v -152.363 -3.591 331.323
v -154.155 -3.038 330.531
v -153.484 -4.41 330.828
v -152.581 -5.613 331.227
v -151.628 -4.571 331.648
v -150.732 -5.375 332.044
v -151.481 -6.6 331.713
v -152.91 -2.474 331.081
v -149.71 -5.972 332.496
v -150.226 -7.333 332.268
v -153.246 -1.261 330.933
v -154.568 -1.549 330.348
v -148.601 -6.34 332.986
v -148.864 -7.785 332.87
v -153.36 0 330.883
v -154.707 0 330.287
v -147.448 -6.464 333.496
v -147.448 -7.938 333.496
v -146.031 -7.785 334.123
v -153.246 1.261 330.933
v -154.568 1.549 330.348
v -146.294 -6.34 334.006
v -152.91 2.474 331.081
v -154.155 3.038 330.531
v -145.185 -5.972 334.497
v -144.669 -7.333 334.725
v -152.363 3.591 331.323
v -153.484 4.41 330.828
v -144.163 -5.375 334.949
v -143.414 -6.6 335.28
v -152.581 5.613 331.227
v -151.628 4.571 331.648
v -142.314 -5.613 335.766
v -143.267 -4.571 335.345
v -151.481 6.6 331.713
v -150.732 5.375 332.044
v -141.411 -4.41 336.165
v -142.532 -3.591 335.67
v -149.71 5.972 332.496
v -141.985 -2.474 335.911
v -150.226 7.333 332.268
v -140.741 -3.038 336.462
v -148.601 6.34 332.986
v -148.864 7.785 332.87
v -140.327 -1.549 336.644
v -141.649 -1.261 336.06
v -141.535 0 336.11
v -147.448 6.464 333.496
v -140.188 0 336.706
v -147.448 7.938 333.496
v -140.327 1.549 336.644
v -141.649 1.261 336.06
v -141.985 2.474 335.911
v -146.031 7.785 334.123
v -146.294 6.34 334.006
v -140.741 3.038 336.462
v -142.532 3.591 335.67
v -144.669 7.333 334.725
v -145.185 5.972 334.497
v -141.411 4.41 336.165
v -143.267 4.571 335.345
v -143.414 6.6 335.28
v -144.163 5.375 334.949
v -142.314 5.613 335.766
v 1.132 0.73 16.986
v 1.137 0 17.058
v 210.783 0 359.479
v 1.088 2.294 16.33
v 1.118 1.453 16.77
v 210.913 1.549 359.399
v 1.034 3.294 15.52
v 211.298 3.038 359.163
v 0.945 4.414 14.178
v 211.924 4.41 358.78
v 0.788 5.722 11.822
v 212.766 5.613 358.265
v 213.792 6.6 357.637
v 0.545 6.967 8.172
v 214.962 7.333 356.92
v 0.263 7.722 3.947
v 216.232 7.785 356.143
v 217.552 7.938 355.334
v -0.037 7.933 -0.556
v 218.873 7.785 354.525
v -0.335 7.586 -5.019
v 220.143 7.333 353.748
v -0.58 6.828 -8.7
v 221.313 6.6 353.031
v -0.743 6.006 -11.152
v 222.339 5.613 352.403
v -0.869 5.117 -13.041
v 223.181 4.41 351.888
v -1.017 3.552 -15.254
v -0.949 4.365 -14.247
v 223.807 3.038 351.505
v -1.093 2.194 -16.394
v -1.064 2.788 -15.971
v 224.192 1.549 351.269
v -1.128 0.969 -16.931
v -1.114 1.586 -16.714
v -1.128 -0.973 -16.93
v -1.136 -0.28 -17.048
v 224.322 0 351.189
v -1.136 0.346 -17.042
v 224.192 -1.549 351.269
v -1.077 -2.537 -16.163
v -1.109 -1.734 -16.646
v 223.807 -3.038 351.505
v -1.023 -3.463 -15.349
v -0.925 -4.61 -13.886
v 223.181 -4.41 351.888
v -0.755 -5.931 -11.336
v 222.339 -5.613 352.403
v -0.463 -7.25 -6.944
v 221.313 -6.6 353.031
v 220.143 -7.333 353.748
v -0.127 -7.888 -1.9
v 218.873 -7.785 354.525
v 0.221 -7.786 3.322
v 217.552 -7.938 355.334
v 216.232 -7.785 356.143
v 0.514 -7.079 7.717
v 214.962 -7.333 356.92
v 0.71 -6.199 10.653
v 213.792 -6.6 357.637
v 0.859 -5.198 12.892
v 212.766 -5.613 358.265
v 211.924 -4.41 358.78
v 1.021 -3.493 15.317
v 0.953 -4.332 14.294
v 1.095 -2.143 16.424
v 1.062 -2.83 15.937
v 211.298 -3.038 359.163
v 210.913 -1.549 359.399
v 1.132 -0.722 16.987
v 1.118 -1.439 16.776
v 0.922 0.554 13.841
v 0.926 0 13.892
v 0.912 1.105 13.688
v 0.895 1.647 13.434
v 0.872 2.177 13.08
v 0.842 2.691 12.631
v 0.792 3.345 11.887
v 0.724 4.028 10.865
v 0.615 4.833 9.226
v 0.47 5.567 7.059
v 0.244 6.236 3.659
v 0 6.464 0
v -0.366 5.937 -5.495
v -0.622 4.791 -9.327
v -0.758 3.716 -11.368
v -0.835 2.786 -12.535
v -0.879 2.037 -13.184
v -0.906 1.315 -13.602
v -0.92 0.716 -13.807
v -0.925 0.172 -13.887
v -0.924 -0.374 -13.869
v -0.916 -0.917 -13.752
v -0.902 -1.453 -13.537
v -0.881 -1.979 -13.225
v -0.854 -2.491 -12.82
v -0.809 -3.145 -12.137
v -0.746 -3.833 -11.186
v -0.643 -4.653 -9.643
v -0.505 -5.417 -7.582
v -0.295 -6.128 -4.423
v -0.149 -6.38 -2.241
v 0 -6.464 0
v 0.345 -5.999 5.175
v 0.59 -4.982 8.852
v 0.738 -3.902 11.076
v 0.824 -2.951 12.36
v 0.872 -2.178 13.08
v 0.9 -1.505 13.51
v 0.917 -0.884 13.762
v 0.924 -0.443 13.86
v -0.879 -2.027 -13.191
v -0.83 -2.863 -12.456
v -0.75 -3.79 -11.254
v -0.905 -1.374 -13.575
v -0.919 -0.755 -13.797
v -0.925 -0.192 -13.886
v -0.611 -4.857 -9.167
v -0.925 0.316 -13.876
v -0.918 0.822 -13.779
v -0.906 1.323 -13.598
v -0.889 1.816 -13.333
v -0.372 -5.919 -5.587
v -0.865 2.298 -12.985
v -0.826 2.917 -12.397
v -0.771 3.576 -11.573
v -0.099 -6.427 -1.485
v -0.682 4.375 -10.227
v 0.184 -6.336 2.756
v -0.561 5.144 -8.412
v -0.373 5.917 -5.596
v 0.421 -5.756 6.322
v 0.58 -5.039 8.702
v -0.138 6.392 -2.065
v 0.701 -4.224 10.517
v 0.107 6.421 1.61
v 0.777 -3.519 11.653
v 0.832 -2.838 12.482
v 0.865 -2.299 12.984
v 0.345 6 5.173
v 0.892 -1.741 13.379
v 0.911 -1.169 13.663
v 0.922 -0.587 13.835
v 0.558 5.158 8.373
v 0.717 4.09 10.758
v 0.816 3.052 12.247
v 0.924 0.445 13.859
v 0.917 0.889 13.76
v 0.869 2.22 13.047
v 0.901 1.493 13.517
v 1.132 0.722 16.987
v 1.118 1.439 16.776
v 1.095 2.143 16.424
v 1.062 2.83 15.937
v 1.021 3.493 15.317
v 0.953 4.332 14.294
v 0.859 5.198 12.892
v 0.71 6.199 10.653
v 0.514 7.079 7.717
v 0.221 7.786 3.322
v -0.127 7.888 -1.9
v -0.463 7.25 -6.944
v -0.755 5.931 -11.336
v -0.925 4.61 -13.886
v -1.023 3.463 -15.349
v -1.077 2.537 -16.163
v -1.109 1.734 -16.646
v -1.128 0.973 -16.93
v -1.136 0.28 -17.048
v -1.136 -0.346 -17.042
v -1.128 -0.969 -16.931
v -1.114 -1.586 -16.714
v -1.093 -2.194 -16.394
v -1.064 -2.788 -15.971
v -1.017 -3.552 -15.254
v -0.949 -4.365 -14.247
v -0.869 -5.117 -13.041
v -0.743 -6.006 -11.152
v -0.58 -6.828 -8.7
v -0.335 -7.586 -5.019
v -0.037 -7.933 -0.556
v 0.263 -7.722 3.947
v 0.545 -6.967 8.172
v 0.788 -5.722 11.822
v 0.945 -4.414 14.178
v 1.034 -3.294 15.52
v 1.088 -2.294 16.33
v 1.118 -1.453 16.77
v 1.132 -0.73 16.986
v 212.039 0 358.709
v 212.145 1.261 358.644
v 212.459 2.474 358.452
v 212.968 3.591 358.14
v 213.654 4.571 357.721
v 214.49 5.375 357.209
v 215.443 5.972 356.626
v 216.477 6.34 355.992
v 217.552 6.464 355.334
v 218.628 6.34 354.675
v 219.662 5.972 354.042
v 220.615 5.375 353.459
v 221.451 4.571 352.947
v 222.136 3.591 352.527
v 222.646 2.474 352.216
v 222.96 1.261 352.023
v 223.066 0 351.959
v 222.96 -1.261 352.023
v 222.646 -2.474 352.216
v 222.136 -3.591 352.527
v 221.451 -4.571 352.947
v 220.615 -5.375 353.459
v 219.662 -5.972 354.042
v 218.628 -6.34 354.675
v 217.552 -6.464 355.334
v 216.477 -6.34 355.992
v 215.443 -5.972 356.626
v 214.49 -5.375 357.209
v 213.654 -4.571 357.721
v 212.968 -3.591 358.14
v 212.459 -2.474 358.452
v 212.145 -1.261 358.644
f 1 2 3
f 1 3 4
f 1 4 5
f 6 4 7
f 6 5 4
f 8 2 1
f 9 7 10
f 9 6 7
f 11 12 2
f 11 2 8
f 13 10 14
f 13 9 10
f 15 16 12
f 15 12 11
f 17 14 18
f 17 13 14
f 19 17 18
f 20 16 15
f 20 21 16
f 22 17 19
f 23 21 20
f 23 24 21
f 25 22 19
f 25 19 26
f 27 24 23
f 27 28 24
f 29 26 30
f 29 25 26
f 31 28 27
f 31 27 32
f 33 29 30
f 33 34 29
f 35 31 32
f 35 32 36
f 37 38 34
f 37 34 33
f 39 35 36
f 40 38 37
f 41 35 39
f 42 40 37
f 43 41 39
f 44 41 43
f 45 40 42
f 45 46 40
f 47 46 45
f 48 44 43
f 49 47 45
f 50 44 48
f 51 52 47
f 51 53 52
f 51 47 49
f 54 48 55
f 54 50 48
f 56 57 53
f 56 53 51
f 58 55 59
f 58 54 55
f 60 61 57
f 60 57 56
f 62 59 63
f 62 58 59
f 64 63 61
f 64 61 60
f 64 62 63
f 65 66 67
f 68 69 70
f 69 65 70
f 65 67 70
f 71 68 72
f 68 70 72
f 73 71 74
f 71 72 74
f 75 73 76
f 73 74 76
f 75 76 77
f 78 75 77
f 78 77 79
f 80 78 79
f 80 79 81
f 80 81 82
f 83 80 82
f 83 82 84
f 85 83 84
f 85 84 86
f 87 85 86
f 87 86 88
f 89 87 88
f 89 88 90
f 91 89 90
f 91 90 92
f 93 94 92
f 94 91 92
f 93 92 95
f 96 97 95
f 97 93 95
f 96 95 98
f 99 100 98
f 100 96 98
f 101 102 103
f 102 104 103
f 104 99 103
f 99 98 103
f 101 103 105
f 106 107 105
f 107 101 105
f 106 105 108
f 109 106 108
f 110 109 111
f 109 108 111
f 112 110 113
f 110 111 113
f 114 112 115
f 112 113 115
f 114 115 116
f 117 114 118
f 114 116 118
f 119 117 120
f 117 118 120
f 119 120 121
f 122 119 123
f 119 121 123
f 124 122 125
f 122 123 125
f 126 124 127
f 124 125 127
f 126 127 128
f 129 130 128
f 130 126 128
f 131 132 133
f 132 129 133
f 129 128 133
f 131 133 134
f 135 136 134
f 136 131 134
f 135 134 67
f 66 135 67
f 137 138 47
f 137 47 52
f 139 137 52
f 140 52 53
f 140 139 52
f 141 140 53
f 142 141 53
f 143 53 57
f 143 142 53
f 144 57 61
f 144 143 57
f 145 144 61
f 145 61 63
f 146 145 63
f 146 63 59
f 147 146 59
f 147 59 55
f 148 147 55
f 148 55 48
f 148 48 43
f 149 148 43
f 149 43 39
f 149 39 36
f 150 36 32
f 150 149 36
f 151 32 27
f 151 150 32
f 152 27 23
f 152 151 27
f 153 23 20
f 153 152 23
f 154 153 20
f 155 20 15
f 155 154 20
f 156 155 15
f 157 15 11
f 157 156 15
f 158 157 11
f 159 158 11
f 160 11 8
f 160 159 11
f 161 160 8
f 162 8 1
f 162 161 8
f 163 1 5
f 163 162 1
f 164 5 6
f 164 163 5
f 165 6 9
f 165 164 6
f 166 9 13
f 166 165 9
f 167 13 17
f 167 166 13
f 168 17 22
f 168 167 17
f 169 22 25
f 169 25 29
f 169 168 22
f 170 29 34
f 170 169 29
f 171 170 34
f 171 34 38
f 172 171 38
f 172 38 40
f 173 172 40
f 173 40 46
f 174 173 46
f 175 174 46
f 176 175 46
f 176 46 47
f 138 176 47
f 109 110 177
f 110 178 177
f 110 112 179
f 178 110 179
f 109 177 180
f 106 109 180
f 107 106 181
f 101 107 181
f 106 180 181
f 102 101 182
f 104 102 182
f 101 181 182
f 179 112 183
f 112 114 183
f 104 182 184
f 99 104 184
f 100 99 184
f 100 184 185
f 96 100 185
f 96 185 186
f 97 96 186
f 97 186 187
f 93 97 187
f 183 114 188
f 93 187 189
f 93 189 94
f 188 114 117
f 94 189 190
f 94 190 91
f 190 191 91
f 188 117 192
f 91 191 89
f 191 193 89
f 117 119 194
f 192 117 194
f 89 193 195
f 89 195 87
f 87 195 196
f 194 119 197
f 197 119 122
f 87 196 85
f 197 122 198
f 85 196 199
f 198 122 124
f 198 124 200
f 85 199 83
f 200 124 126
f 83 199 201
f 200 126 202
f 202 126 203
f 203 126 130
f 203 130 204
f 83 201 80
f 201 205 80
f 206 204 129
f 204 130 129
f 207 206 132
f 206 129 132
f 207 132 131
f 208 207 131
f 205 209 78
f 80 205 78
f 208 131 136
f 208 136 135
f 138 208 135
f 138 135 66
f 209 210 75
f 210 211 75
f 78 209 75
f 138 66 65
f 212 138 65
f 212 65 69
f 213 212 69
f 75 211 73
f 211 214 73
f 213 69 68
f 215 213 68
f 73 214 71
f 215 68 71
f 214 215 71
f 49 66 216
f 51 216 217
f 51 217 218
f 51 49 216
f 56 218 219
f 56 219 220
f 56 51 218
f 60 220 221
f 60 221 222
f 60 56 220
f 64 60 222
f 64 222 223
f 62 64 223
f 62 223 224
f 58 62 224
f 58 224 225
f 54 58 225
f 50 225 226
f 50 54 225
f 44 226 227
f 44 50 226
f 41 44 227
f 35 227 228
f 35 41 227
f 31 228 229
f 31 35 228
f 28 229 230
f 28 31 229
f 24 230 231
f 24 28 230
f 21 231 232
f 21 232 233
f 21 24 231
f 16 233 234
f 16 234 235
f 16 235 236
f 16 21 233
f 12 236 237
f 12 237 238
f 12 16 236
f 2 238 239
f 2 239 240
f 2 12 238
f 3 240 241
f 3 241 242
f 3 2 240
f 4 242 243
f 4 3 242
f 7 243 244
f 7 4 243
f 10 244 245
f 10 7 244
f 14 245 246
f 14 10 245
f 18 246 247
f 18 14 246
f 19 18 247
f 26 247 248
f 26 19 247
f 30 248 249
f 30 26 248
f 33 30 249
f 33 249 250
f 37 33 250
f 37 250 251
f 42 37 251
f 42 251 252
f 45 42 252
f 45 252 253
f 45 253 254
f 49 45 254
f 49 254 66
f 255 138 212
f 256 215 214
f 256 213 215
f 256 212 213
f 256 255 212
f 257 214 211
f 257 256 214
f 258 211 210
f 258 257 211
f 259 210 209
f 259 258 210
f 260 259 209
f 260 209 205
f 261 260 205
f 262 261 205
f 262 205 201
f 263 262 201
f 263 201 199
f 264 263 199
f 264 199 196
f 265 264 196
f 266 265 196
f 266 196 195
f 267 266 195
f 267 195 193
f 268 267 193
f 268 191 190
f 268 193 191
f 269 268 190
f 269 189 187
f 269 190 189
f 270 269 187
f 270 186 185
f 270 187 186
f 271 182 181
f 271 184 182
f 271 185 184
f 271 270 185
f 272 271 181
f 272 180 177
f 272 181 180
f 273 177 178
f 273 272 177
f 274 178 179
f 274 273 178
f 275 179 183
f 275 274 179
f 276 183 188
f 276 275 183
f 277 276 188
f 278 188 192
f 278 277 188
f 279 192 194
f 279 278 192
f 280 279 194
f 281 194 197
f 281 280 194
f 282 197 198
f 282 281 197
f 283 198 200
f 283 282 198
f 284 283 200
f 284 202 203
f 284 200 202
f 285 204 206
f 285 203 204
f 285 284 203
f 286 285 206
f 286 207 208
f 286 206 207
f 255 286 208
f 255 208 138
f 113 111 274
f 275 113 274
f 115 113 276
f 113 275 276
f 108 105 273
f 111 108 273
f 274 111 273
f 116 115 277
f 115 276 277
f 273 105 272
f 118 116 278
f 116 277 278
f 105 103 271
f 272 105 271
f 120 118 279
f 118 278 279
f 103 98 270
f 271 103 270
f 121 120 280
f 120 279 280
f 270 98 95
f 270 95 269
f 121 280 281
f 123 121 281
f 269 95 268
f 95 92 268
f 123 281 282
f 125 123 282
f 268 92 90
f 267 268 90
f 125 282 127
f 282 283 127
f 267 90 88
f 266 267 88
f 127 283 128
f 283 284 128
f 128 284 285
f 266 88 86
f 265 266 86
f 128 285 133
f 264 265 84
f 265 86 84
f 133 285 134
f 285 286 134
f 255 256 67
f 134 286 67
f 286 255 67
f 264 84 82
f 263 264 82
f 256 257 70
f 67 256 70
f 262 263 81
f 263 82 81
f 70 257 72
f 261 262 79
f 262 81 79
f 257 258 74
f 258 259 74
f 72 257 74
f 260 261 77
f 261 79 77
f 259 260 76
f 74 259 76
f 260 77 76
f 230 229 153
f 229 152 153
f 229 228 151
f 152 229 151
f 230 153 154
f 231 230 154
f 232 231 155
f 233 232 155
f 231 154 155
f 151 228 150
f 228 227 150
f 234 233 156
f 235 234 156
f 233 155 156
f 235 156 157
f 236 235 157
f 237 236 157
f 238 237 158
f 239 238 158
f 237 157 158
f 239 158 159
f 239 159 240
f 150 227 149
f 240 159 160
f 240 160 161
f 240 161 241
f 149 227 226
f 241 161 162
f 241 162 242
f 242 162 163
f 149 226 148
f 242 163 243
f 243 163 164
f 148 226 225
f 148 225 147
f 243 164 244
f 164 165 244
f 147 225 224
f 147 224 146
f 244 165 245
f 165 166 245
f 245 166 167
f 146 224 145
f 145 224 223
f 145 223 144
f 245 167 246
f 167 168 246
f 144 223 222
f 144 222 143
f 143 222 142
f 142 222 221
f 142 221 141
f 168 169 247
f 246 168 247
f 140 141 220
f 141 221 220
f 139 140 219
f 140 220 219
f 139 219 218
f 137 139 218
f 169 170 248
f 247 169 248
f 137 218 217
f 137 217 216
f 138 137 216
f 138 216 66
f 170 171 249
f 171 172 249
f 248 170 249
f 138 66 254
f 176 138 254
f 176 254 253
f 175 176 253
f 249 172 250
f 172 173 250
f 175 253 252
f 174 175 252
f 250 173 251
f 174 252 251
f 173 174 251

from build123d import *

# Parameters (mm, degrees)
SKETCH1_ON_SEGMENT_1_R          = 7.9375
SKETCH1_ON_SEGMENT_1_R_2        = 6.4643
STRUCTURAL_MEMBER1_DEPTH        = 439.056418566
SKETCH1_R                       = 7.9375
SKETCH1_R_2                     = 6.4643
STRUCTURAL_MEMBER1_2_DEPTH      = 364.637720715
STRUCTURAL_MEMBER1_2_DEPTH_BACK = 22.41356204


with BuildPart() as part:
    # Sketch1 on segment 1 (carried to segment 1) → Structural Member1 (new body)
    with BuildSketch(Plane(origin=(217.552437832, 0, 355.333936864), x_dir=(-0.852850184, 0, 0.522155689), z_dir=(-0.522155689, 0, -0.852850184))):
        Circle(SKETCH1_ON_SEGMENT_1_R)
        Circle(SKETCH1_ON_SEGMENT_1_R_2, mode=Mode.SUBTRACT)
    extrude(amount=STRUCTURAL_MEMBER1_DEPTH)

    # Structural Member1 mitre 1
    split(bisect_by=Plane(origin=(0, 0, 0), x_dir=(0, 1, 0), z_dir=(0.997786708, 0, -0.066495754)), keep=Keep.TOP)


with BuildPart() as body_2:
    # Sketch1 → Structural Member1 2 (new, two sides)
    with BuildSketch(Plane(origin=(0, 0, 0), x_dir=(0.9145966900221395, 0, 0.40436727686664553), z_dir=(-0.4043672768666456, 0, 0.9145966900221396))) as structural_member1_2_sk:
        Circle(SKETCH1_R)
        Circle(SKETCH1_R_2, mode=Mode.SUBTRACT)
    extrude(amount=STRUCTURAL_MEMBER1_2_DEPTH)
    extrude(structural_member1_2_sk.sketch, amount=-STRUCTURAL_MEMBER1_2_DEPTH_BACK)

    # Structural Member1 2 mitre 1
    split(bisect_by=Plane(origin=(0, 0, 0), x_dir=(0, -1, 0), z_dir=(-0.997786708, 0, 0.066495754)), keep=Keep.TOP)


solid = Compound([part.part, body_2.part])
